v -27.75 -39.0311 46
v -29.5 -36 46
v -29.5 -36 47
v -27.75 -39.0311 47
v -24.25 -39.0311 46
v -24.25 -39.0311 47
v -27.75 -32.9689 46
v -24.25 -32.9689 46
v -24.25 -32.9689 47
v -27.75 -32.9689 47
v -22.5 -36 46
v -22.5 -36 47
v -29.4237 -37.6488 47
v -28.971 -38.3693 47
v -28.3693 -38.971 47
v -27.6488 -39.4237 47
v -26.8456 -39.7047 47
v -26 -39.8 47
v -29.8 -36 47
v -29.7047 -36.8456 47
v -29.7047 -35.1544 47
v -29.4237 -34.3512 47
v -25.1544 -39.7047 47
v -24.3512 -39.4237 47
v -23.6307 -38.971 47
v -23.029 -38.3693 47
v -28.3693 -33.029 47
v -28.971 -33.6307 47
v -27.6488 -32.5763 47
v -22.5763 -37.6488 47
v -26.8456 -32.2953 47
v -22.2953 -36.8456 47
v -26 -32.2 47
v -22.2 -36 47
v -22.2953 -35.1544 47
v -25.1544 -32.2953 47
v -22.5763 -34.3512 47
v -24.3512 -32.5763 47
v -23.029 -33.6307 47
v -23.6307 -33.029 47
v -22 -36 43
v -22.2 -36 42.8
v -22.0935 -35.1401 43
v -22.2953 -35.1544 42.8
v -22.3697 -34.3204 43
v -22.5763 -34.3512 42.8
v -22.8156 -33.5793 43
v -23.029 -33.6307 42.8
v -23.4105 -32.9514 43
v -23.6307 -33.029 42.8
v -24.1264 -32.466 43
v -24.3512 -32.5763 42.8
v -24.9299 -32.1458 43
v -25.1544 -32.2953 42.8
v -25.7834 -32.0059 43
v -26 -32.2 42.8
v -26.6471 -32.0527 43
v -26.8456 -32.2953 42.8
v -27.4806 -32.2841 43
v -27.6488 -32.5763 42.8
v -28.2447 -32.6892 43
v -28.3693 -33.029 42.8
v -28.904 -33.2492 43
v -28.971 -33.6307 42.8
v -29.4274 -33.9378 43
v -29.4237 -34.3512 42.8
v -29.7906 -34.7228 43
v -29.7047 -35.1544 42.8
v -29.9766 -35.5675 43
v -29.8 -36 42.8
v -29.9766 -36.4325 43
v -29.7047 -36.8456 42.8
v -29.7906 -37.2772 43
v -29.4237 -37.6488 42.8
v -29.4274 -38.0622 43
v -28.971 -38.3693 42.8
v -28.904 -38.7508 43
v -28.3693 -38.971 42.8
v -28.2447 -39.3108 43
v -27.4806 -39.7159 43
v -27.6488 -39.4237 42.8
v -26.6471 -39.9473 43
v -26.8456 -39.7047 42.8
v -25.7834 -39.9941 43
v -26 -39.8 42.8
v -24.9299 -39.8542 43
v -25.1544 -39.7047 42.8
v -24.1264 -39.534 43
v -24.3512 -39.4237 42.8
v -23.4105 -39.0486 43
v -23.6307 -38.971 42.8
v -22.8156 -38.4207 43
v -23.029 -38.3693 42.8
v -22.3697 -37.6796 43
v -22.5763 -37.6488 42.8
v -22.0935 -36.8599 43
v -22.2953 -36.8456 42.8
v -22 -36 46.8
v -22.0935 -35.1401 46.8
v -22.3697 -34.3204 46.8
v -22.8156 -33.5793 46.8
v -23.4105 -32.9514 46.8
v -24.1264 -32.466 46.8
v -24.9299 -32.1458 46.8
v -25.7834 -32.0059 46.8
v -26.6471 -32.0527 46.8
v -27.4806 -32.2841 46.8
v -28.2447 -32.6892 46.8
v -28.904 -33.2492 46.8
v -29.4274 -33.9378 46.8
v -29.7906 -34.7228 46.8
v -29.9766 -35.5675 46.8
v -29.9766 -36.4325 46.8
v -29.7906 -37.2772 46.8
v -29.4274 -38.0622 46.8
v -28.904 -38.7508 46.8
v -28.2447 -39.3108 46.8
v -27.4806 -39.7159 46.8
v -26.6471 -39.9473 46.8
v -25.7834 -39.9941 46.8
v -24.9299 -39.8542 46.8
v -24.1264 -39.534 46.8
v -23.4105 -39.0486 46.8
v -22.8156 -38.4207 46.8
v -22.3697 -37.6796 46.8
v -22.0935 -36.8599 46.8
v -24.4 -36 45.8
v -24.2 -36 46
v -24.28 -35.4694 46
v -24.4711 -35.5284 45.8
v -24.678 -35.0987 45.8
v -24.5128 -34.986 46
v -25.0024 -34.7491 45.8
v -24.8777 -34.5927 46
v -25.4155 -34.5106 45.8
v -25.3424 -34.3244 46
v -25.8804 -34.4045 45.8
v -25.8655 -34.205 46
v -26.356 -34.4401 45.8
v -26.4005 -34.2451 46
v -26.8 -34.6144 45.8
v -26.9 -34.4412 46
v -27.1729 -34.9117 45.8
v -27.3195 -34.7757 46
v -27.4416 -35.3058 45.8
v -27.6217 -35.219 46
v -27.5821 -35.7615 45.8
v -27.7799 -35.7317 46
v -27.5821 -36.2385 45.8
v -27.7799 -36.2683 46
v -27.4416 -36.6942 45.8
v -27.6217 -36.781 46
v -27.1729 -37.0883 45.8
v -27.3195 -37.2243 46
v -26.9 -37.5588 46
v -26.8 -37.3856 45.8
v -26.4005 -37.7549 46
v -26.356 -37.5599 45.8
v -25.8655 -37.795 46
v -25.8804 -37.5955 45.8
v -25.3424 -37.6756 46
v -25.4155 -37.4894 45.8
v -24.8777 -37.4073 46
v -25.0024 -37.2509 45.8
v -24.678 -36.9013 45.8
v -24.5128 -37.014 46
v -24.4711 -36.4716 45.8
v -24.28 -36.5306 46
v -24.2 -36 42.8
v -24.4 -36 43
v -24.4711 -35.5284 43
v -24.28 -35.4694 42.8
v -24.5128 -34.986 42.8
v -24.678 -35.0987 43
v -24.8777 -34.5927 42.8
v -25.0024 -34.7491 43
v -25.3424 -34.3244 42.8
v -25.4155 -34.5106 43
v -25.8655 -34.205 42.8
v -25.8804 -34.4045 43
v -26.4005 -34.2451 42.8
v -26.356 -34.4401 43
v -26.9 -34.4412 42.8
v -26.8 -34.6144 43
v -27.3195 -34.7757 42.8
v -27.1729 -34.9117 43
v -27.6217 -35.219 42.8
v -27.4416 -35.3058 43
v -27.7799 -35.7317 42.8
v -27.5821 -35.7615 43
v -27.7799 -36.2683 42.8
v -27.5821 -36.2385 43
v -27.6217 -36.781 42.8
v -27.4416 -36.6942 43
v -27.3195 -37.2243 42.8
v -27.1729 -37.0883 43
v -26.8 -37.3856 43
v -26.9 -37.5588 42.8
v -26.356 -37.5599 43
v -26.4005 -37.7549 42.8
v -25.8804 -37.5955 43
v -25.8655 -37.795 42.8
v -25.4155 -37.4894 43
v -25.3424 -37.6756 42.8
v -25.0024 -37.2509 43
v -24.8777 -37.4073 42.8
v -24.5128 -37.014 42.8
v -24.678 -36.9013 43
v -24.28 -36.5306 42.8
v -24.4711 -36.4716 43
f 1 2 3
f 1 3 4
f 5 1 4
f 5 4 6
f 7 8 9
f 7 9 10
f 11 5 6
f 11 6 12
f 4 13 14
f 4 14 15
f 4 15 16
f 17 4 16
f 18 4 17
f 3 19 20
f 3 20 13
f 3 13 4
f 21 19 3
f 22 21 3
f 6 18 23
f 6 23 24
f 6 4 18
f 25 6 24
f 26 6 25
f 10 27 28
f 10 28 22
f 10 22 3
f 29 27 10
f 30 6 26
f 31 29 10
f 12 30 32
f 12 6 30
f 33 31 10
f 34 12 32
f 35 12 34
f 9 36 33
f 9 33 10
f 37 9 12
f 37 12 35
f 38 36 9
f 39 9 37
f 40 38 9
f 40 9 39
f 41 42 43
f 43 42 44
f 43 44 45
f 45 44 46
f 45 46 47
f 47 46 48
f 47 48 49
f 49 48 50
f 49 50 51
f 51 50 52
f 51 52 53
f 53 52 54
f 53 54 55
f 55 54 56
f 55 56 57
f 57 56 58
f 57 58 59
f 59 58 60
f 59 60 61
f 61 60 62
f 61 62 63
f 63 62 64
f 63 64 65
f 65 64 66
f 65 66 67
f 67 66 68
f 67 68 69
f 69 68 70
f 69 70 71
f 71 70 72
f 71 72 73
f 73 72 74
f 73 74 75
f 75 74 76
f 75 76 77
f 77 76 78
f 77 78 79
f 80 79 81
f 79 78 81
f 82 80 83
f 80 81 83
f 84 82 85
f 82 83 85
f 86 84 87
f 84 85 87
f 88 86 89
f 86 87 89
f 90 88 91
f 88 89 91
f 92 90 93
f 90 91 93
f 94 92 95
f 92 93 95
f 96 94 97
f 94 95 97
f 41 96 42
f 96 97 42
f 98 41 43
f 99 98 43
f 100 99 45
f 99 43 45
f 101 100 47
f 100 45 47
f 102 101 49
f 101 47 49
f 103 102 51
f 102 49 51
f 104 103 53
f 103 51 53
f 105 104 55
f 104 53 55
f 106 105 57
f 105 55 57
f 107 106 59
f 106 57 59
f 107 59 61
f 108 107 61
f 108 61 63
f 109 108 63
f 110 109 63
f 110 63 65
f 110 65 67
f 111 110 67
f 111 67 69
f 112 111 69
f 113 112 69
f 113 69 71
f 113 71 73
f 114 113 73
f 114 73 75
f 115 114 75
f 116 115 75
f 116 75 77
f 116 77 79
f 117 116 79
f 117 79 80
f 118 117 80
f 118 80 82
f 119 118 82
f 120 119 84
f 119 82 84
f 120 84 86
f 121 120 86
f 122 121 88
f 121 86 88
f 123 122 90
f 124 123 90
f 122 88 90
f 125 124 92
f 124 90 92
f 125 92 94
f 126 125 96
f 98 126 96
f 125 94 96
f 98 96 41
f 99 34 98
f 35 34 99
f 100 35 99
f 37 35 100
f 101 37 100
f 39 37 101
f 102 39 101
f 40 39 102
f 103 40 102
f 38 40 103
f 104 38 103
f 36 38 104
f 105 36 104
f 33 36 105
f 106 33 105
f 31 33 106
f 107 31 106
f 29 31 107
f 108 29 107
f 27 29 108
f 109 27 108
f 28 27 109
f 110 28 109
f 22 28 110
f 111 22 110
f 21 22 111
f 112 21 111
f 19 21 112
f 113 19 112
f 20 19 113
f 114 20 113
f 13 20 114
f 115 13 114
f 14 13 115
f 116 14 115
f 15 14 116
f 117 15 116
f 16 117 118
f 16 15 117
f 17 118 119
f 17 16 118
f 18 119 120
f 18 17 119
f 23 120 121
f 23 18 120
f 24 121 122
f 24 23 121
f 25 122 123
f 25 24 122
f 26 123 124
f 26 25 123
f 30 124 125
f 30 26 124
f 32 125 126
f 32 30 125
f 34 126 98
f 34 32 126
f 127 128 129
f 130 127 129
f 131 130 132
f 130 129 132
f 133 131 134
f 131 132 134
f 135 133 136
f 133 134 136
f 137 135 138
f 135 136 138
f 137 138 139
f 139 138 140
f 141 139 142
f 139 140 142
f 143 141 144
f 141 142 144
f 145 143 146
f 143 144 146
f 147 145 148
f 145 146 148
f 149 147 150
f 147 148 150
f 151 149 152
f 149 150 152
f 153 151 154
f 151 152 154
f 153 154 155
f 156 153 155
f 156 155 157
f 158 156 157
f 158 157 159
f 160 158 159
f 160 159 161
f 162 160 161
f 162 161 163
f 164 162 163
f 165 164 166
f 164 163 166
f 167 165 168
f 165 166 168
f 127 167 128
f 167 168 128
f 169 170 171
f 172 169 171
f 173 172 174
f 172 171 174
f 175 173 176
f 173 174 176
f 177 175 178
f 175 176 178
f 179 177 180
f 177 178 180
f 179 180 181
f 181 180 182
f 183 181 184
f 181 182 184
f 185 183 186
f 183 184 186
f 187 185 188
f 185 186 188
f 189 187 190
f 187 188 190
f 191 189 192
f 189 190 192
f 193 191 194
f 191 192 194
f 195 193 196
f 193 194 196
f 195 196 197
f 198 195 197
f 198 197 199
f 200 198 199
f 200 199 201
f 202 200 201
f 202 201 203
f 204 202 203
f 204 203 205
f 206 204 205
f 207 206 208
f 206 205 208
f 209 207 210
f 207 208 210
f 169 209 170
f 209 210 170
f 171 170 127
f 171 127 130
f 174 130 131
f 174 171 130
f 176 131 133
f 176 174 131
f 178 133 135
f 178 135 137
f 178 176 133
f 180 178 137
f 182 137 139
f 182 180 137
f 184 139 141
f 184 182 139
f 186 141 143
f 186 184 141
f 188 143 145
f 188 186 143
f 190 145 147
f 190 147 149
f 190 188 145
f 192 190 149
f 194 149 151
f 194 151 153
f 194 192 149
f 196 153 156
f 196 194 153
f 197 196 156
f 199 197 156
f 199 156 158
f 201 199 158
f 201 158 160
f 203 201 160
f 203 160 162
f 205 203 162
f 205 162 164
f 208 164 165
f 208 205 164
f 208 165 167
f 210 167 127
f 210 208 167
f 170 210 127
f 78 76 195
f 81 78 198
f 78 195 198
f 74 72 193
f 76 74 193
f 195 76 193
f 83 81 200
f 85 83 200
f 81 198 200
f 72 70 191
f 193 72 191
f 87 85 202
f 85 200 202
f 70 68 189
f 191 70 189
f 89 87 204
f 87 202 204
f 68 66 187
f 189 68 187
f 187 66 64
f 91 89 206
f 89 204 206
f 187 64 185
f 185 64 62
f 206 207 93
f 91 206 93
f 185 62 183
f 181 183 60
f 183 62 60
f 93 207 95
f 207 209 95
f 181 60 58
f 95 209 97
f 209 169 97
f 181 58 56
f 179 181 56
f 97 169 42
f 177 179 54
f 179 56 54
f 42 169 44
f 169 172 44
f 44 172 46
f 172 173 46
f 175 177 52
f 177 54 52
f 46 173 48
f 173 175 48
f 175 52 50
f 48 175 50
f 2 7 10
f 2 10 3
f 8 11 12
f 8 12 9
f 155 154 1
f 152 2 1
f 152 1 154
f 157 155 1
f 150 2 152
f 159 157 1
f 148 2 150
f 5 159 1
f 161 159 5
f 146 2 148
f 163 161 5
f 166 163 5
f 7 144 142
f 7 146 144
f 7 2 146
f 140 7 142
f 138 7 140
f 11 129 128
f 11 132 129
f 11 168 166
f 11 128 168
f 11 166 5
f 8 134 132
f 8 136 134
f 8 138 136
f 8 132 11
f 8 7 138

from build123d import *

# Parameters (mm, degrees)
SKETCH182_R     = 4
SKETCH182_R_2   = 1.6
PAD075_DEPTH    = 3.2
SKETCH183_R     = 4
PAD076_DEPTH    = 1
CHAMFER032_SIZE = 0.2


with BuildPart() as part:
    # Sketch182 → Pad075 (new body)
    with BuildSketch(Plane.XY):
        Circle(SKETCH182_R)
        Circle(SKETCH182_R_2, mode=Mode.SUBTRACT)
    extrude(amount=PAD075_DEPTH)

    # Sketch183 (on Face4 of Pad075) → Pad076 (join)
    with BuildSketch(Plane.XY.offset(3.2)):
        Circle(SKETCH183_R)
        Polygon((3.5, 0), (1.75, 3.031089), (-1.75, 3.031089), (-3.5, 0), (-1.75, -3.031089), (1.75, -3.031089), align=None, mode=Mode.SUBTRACT)
    extrude(amount=PAD076_DEPTH)

    # Chamfer032
    chamfer032_edges = [part.edges().sort_by_distance(p)[0] for p in [
        (-1.6, 0, 3.2),
        (-1.6, 0, 0),
        (-4, 0, 0),
        (-4, 0, 4.2),
    ]]
    chamfer(chamfer032_edges, length=CHAMFER032_SIZE)


with BuildPart() as part_1:
    # Body049 placement: moved
    add(part.part.moved(Location((-26, -36, 42.8))))


solid = part_1.part
